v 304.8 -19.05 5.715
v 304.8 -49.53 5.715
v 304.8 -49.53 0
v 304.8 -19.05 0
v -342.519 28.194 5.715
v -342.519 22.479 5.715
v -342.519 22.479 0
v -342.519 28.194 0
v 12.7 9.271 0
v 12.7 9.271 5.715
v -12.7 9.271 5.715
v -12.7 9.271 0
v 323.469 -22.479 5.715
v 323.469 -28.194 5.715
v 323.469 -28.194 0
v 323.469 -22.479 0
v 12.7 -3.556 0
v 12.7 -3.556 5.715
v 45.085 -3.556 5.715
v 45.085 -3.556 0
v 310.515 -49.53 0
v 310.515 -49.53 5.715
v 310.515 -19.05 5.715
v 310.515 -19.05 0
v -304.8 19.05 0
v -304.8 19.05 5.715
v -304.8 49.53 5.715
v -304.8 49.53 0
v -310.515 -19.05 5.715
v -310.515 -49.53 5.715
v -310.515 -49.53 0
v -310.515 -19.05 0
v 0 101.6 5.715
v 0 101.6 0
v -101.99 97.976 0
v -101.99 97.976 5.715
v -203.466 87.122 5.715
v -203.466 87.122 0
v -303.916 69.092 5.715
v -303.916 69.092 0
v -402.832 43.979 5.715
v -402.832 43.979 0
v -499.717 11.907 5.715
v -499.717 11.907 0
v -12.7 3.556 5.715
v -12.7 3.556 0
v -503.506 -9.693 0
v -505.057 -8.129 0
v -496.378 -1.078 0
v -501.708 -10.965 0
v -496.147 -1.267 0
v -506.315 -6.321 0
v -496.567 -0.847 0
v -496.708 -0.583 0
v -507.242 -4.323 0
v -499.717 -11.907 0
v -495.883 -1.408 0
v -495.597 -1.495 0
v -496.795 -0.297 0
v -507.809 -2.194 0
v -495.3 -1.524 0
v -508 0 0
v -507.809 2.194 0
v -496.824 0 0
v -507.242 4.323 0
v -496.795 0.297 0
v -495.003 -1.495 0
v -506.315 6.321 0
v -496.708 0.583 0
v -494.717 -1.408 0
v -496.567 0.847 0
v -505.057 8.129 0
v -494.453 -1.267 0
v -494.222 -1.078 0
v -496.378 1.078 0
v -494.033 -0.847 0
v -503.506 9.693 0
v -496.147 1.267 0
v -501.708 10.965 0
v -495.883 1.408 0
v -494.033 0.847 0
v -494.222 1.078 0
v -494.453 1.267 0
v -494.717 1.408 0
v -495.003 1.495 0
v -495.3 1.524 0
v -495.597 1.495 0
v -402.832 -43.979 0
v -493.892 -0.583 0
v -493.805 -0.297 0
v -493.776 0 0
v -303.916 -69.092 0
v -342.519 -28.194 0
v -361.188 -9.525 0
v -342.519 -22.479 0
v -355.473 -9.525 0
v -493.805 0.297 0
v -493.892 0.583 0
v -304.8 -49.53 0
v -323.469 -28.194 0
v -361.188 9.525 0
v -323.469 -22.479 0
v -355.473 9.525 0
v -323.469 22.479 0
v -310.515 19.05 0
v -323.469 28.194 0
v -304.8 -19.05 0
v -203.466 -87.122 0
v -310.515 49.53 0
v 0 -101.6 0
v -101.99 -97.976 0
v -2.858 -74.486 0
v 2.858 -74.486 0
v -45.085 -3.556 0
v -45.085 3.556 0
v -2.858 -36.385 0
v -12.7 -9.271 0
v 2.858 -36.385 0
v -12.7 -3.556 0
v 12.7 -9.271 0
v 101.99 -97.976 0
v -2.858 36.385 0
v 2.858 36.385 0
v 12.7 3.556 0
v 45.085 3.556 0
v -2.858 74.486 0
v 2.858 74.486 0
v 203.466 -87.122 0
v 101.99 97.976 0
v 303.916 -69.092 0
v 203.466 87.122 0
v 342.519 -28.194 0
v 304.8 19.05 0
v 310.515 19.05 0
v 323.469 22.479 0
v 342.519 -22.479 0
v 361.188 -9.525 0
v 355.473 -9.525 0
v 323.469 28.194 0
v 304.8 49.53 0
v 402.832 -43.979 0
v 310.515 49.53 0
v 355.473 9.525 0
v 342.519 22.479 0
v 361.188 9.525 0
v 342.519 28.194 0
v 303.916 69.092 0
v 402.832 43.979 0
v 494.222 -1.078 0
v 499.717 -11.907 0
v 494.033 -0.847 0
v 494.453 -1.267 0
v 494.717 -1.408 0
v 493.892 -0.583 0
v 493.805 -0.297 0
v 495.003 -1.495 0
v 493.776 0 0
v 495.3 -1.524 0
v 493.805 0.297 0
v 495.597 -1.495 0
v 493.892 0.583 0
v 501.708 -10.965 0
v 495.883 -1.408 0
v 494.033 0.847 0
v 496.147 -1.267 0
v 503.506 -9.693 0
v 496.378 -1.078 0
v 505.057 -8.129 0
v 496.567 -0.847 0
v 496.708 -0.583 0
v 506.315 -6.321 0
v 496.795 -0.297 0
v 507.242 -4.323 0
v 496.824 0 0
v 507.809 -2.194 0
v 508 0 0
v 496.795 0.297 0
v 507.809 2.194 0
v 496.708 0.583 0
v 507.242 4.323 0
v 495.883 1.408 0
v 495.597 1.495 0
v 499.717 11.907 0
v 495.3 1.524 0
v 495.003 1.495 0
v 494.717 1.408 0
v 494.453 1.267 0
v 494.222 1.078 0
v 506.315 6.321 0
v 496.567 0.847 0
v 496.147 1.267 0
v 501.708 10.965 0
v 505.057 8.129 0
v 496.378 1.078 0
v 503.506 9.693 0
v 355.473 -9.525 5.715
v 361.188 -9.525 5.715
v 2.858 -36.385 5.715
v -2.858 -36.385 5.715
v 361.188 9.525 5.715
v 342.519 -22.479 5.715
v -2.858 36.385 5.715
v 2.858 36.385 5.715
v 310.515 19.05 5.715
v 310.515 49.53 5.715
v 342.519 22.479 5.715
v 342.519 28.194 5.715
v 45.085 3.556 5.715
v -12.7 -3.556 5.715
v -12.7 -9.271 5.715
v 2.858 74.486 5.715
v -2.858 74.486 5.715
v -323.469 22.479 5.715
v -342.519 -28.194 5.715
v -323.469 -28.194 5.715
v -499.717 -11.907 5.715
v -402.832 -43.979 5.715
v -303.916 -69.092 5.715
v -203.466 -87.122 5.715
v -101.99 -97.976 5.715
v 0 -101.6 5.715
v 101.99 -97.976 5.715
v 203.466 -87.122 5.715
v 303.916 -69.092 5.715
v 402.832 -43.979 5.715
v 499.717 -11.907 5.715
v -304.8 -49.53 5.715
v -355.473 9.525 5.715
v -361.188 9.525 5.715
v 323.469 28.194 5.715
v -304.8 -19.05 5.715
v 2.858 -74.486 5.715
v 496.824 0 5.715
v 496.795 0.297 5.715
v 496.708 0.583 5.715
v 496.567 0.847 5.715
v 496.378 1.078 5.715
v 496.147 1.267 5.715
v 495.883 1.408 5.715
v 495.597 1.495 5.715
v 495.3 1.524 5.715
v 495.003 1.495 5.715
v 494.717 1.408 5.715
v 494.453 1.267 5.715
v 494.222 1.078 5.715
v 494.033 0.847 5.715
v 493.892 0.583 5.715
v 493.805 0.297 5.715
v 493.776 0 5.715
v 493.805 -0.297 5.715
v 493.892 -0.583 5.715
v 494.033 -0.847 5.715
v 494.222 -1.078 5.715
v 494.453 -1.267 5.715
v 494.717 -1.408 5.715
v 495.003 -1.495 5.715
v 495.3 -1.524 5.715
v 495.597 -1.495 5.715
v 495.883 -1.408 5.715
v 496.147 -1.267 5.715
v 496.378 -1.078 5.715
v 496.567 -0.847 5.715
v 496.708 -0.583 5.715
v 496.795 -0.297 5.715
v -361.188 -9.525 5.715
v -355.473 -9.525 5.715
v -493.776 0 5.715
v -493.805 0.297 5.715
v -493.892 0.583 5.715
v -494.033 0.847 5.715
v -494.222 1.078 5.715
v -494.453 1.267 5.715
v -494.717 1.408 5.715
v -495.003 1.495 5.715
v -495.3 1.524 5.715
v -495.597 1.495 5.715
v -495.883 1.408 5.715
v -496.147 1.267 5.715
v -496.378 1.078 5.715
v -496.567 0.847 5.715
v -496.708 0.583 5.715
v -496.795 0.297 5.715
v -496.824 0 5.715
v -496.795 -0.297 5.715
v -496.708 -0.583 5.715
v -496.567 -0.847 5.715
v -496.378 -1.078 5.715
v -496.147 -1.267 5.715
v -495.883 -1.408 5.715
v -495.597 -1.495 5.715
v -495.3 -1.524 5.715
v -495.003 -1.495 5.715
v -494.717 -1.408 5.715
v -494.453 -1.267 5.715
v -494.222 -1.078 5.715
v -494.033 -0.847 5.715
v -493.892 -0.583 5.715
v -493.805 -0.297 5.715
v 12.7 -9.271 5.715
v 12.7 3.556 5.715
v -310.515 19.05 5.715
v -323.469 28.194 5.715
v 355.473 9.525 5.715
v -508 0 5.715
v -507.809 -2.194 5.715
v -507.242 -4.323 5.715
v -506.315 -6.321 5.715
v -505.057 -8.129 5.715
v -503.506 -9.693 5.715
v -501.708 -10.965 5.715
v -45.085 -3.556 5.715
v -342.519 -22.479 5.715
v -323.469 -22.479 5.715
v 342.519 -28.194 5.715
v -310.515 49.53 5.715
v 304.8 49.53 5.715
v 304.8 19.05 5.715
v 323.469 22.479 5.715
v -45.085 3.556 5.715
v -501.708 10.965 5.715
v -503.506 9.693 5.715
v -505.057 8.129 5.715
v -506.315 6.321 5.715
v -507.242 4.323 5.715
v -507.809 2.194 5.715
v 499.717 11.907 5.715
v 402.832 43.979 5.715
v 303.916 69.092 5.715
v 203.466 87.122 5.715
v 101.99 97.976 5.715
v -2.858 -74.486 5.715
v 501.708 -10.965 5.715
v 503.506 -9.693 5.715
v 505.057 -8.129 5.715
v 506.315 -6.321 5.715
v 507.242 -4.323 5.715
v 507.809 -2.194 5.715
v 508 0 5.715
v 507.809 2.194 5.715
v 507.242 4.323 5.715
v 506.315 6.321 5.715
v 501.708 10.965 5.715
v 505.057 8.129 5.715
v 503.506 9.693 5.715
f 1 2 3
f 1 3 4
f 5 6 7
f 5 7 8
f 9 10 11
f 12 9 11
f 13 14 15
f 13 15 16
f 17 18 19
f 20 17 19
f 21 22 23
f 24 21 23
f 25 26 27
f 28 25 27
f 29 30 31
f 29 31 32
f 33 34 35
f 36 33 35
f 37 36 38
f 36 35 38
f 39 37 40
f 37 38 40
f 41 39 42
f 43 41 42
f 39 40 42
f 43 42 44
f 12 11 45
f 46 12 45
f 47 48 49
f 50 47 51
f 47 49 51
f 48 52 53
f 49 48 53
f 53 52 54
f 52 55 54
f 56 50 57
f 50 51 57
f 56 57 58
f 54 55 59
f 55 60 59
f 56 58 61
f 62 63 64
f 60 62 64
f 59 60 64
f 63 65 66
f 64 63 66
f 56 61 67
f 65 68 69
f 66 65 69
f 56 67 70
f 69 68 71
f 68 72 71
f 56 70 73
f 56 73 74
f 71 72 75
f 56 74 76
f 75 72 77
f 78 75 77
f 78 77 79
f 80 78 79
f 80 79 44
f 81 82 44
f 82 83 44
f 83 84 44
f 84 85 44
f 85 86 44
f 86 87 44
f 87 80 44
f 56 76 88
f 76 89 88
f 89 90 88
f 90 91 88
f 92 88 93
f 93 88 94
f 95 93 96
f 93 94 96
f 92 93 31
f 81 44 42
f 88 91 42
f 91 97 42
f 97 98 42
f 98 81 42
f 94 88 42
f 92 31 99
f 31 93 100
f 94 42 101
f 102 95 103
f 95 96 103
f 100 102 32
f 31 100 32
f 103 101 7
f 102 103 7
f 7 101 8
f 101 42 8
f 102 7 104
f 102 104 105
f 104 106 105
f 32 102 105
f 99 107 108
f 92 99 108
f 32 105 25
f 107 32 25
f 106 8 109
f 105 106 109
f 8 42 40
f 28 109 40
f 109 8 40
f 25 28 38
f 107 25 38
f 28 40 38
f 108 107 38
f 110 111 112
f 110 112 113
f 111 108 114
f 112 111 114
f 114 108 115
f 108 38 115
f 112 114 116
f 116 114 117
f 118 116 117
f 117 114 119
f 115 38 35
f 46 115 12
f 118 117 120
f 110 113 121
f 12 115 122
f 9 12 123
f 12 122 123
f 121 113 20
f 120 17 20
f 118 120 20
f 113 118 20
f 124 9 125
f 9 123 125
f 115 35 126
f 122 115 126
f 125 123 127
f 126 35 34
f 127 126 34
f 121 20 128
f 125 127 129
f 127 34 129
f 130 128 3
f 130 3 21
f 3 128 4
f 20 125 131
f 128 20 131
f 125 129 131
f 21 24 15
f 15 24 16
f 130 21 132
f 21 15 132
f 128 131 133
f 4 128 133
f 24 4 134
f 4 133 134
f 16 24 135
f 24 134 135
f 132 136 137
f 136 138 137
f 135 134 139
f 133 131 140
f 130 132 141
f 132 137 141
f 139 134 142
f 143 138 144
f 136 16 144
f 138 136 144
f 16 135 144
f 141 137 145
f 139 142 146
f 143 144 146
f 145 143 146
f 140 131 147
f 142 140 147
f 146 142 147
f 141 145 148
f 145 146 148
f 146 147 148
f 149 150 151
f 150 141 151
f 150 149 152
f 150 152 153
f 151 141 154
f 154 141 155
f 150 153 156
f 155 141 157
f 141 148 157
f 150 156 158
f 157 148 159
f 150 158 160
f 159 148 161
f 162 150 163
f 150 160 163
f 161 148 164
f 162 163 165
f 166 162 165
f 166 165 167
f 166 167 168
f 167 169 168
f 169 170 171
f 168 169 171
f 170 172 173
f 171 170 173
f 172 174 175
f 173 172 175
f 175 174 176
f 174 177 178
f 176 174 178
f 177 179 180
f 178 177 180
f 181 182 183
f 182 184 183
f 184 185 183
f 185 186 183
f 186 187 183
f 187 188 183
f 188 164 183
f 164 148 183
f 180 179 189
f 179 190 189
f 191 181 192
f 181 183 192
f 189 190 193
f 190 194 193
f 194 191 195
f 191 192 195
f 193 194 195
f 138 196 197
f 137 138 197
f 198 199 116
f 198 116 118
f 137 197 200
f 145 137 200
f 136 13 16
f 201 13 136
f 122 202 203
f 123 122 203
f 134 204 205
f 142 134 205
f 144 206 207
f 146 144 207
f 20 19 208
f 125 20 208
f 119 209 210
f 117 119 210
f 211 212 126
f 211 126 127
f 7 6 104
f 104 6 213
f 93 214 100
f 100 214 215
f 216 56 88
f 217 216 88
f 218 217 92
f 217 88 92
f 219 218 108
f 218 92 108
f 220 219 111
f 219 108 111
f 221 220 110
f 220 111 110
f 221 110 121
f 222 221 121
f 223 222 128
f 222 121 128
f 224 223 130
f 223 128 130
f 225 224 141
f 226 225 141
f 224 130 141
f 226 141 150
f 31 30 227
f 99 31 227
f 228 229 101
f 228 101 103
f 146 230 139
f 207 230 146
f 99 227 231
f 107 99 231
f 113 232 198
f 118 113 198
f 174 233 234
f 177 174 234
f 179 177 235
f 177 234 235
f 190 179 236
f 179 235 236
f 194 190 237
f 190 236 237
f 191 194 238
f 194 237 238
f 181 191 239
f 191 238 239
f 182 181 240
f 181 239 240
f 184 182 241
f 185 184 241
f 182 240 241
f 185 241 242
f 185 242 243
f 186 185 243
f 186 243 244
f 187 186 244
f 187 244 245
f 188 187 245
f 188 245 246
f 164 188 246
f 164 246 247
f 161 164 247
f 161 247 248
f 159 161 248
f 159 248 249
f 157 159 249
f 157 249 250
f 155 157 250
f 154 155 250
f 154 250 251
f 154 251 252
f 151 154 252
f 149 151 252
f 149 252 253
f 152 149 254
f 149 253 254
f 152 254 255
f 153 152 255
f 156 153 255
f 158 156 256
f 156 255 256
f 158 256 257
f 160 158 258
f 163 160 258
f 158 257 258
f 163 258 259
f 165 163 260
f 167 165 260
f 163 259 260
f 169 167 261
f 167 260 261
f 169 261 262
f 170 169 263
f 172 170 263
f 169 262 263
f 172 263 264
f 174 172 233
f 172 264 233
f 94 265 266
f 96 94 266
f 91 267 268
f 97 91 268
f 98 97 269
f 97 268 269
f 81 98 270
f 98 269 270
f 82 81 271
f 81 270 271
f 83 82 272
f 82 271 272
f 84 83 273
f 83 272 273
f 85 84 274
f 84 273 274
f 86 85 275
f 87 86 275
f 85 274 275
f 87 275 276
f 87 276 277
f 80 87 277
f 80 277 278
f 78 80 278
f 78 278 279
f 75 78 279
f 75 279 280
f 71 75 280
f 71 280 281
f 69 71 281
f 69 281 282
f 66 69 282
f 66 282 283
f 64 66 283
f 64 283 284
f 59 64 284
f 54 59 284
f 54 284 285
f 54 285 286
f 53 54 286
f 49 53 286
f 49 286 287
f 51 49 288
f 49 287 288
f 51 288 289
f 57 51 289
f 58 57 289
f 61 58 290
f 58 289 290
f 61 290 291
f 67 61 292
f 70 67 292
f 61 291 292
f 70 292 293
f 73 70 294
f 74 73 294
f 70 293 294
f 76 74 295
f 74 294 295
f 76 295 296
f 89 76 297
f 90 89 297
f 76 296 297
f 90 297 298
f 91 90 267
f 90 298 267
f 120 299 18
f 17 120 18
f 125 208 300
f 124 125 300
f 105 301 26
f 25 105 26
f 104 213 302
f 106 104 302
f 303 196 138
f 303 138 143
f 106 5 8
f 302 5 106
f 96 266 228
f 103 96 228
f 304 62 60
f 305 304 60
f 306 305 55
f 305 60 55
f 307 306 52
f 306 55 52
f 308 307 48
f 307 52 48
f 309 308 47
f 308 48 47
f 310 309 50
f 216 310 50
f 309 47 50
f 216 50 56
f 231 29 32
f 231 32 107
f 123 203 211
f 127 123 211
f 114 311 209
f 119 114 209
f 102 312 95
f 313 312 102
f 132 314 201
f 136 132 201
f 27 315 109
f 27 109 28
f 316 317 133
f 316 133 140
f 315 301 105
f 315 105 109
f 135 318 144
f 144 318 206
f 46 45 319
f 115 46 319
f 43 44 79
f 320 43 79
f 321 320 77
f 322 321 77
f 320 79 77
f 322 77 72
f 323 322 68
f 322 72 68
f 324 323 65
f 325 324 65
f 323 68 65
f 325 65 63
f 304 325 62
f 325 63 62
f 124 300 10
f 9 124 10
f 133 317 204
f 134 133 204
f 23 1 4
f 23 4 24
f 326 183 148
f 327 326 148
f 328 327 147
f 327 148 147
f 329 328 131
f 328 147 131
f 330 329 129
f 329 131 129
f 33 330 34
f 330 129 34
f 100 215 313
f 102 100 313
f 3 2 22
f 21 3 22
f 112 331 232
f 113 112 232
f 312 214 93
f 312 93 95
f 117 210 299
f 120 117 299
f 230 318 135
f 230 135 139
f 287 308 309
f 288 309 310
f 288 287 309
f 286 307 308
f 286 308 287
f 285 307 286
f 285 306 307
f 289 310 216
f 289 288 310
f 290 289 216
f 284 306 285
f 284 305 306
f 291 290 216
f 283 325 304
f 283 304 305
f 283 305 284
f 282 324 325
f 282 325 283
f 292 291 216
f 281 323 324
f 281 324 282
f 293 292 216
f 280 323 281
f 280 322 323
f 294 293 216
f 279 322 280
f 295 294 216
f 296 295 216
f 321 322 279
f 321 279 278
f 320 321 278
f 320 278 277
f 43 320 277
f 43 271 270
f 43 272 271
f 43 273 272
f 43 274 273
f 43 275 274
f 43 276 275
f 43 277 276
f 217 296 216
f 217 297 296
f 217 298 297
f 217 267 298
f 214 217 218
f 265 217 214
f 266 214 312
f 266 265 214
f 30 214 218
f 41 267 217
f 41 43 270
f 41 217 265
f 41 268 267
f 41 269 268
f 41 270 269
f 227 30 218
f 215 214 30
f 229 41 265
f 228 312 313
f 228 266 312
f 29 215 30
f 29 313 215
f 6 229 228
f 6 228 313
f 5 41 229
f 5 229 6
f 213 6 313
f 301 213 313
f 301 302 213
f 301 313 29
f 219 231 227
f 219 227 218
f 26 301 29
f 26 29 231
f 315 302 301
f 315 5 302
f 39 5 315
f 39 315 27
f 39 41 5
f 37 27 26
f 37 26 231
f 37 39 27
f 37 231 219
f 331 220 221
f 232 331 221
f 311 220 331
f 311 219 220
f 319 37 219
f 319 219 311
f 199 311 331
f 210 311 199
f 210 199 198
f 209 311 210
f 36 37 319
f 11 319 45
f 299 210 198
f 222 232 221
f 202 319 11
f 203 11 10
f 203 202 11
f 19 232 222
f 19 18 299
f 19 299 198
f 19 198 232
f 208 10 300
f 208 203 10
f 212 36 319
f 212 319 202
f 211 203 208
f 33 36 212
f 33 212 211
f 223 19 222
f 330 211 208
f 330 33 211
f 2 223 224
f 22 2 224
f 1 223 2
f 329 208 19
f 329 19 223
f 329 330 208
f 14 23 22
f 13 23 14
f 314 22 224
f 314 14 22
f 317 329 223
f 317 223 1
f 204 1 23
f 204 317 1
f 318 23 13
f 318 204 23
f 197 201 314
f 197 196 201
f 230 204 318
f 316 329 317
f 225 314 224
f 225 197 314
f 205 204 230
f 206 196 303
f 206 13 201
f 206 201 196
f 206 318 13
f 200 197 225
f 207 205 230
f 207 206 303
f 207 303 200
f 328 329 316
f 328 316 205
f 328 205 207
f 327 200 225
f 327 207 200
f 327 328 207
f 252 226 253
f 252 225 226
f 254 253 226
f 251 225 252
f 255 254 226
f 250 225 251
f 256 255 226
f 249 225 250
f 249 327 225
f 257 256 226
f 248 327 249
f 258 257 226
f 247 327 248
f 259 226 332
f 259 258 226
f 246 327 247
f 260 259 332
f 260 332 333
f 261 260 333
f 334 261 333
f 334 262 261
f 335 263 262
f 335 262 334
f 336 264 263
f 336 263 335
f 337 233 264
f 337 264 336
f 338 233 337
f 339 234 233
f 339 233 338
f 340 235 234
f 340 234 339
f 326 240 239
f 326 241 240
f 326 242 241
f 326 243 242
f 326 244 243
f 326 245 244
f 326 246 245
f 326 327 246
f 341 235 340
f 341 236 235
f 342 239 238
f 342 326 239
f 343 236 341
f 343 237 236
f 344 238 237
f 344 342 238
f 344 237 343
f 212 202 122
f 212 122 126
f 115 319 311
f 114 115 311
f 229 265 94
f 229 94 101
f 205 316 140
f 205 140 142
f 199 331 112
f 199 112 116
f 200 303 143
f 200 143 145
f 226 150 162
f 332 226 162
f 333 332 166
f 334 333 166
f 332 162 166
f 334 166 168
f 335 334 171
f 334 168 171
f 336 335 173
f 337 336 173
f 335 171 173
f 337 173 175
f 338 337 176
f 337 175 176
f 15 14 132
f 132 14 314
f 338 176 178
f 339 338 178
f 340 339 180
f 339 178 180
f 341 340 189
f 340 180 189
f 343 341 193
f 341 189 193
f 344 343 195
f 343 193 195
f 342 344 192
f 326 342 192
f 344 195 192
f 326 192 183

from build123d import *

# Parameters (mm, degrees)
F1_DEPTH  = 5.715
F4_DEPTH  = 5.716
F5_W      = 5.715
F5_H      = 38.1
F6_DEPTH  = 5.716
F7_W      = 5.715
F7_H      = 30.48
F8_DEPTH  = 5.716
F9_W      = 19.05
F9_H      = 5.715
F9_W_2    = 5.715
F9_H_2    = 19.05
F10_DEPTH = 5.716
F11_R     = 1.524
F12_DEPTH = 5.716


with BuildPart() as f1:
    # F0 (on Top) → F1 (new body)
    with BuildSketch(Plane.XY):
        with BuildLine():
            ThreePointArc((0, 101.6), (-253.851116, 78.999073), (-499.716688, 11.907261))
            ThreePointArc((-499.716688, 11.907261), (-505.725496, 7.252519), (-508, 0))
            ThreePointArc((-508, 0), (-505.725496, -7.252519), (-499.716688, -11.907261))
            ThreePointArc((-499.716688, -11.907261), (-253.851116, -78.999073), (0, -101.6))
            ThreePointArc((0, -101.6), (253.851116, -78.999073), (499.716688, -11.907261))
            ThreePointArc((499.716688, -11.907261), (505.725496, -7.252519), (508, 0))
            ThreePointArc((508, 0), (505.725496, 7.252519), (499.716688, 11.907261))
            ThreePointArc((499.716688, 11.907261), (253.851116, 78.999073), (0, 101.6))
        make_face()
    extrude(amount=F1_DEPTH)

    # F3 (on face) → F4 (cut, through all)
    with BuildSketch(Plane.XY.offset(5.715)):
        Polygon((-45.085, 3.556), (-45.085, 0), (-45.085, -3.556), (-12.7, -3.556), (-12.7, -9.271), (0, -9.271), (12.7, -9.271), (12.7, -3.556), (45.085, -3.556), (45.085, 0), (45.085, 3.556), (12.7, 3.556), (12.7, 9.271), (0, 9.271), (-12.7, 9.271), (-12.7, 3.556), align=None)
    extrude(amount=-F4_DEPTH, mode=Mode.SUBTRACT)

    # F5 (on face) → F6 (cut, through all)
    with BuildSketch(Plane.XY.offset(5.715)):
        with Locations((0, 55.4355)):
            Rectangle(F5_W, F5_H)
        with Locations((0, -55.4355)):
            Rectangle(F5_W, F5_H)
    extrude(amount=-F6_DEPTH, mode=Mode.SUBTRACT)

    # F7 (on face) → F8 (cut, through all)
    with BuildSketch(Plane.XY.offset(5.715)):
        with Locations((-307.6575, 34.29)):
            Rectangle(F7_W, F7_H)
        with Locations((-307.6575, -34.29)):
            Rectangle(F7_W, F7_H)
        with Locations((307.6575, -34.29)):
            Rectangle(F7_W, F7_H)
        with Locations((307.6575, 34.29)):
            Rectangle(F7_W, F7_H)
    extrude(amount=-F8_DEPTH, mode=Mode.SUBTRACT)

    # F9 (on face) → F10 (cut, through all)
    with BuildSketch(Plane.XY.offset(5.715)):
        with Locations((-332.994, 25.3365)):
            Rectangle(F9_W, F9_H)
        with Locations((-358.3305, 0)):
            Rectangle(F9_W_2, F9_H_2)
        with Locations((-332.994, -25.3365)):
            Rectangle(F9_W, F9_H)
        with Locations((332.994, -25.3365)):
            Rectangle(F9_W, F9_H)
        with Locations((358.3305, 0)):
            Rectangle(F9_W_2, F9_H_2)
        with Locations((332.994, 25.3365)):
            Rectangle(F9_W, F9_H)
    extrude(amount=-F10_DEPTH, mode=Mode.SUBTRACT)

    # F11 (on face) → F12 (cut, through all)
    with BuildSketch(Plane.XY.offset(5.715)):
        with Locations((-495.3, 0)):
            Circle(F11_R)
        with Locations((495.3, 0)):
            Circle(F11_R)
    extrude(amount=-F12_DEPTH, mode=Mode.SUBTRACT)


solid = f1.part
